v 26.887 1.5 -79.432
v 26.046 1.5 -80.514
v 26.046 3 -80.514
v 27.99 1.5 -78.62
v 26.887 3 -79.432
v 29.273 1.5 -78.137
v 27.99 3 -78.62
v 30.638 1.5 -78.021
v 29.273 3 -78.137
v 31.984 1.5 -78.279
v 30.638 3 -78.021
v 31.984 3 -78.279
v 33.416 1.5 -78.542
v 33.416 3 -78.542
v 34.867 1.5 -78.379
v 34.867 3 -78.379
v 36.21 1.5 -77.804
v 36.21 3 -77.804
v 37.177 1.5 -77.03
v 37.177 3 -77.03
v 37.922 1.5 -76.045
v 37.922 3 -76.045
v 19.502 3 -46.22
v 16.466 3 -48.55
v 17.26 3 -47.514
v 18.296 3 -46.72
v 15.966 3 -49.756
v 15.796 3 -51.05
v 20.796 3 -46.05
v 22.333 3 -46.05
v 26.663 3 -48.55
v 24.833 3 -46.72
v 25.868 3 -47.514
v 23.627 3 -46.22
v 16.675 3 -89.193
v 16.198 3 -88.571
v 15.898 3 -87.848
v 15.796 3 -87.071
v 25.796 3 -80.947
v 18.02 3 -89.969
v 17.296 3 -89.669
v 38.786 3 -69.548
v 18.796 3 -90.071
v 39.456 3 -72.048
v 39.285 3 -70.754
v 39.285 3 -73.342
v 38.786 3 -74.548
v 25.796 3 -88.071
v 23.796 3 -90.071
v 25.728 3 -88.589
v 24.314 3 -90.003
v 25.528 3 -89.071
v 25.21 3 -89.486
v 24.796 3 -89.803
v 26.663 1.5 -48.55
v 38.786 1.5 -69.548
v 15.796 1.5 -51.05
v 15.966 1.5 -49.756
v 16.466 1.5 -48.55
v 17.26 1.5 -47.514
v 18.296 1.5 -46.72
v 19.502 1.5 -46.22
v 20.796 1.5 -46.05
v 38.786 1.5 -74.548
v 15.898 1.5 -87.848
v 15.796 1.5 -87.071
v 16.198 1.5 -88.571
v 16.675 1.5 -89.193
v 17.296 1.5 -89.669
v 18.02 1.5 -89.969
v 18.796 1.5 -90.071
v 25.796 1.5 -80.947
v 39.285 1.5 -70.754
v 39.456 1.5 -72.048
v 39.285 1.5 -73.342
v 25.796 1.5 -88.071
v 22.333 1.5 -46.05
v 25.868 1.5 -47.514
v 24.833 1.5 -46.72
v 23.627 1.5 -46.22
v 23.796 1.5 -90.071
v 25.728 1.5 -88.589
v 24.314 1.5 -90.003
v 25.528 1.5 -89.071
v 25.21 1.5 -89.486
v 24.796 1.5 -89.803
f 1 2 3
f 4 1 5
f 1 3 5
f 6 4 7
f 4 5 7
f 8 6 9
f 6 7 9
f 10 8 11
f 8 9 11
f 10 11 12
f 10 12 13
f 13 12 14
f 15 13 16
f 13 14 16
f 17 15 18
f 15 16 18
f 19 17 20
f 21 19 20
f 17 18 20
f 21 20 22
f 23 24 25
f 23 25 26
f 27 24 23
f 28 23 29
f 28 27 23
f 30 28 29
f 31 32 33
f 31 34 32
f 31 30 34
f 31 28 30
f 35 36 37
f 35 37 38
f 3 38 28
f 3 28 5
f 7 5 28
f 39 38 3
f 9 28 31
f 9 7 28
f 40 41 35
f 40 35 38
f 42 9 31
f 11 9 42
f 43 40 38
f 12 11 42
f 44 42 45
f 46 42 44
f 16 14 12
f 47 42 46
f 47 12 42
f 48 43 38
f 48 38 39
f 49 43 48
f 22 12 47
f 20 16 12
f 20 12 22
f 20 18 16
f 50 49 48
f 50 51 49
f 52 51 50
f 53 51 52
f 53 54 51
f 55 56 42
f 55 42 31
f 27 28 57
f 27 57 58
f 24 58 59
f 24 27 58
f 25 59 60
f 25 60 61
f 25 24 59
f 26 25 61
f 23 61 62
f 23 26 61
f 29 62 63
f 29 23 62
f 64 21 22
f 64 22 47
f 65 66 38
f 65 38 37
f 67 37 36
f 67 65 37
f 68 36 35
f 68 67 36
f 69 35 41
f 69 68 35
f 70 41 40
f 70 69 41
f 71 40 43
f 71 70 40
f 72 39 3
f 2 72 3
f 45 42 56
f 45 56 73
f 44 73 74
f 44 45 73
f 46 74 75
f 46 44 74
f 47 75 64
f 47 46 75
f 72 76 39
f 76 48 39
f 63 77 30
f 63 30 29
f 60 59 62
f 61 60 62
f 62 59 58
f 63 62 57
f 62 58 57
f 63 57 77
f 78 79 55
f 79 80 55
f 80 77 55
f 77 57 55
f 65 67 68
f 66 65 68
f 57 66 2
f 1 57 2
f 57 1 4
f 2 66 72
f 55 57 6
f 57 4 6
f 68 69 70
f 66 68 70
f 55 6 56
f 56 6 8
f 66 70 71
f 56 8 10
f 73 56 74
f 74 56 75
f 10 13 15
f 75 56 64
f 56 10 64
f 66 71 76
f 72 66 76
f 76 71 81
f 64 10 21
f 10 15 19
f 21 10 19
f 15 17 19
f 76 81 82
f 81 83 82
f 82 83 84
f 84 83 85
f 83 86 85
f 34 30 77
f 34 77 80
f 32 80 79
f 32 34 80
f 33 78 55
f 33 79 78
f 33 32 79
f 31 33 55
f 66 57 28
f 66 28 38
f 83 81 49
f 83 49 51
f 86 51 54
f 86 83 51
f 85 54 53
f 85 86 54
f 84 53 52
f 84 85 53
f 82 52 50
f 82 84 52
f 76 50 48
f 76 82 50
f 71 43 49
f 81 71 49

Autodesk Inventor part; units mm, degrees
ref_plane "YZ Plane" through (0, 0, 0) normal (1, 0, 0) x (0, 1, 0)
ref_plane "XZ Plane" through (0, 0, 0) normal (0, 1, 0) x (-1, 0, 0)
ref_plane "XY Plane" through (0, 0, 0) normal (0, 0, 1) x (1, 0, 0)
sketch "スケッチ1" plane through (0, 0, 0) normal (0, 1, 0) x (-1, 0, 0)
  line L0 (75, 0) -> (105, -51.9615)
  line L1 (-75, 0) -> (-105, -51.9615)
  line L2 (0, -218.2384) -> (0, 36.3731)
  line L3 (147, 0) -> (-147, 0)
  line L4 (37.5, -27) -> (-37.5, -27)
  line L5 (105, -51.9615) -> (30, -181.8653)
  line L6 (30, -181.8653) -> (-30, -181.8653)
  line L7 (-30, -181.8653) -> (-105, -51.9615)
  line L8 (75, 0) -> (-75, 0)
  line L9 (-25.3673, -135.8894) -> (-62.8673, -70.9375)
  line L10 (25.3673, -135.8894) -> (62.8673, -70.9375)
  line L11 (-37.5, -27) -> (-27.5, -27)
  line L12 (-27.5, -27) -> (-27.5, -39)
  line L13 (-27.5, -39) -> (-37.5, -39)
  line L14 (-37.5, -39) -> (-37.5, -27)
  line L15 (37.5, -27) -> (27.5, -27)
  line L16 (27.5, -27) -> (27.5, -39)
  line L17 (27.5, -39) -> (37.5, -39)
  line L18 (37.5, -39) -> (37.5, -27)
  line L19 (0, -77.9423) -> (44.1173, -103.4134) construction
  line L20 (0, -77.9423) -> (-44.1173, -103.4134) construction
  line L21 (-44.1173, -103.4134) -> (-67.5, -116.9134) construction
  line L22 (-57.8673, -79.5977) -> (-47.475, -73.5977)
  line L23 (-52.475, -64.9375) -> (-62.8673, -70.9375)
  line L24 (-62.8673, -70.9375) -> (-57.8673, -79.5977)
  line L25 (-47.475, -73.5977) -> (-52.475, -64.9375)
  line L26 (-25.3673, -135.8894) -> (-30.3673, -127.2291)
  line L27 (-19.975, -121.2291) -> (-14.975, -129.8894)
  line L28 (-14.975, -129.8894) -> (-25.3673, -135.8894)
  line L29 (-30.3673, -127.2291) -> (-19.975, -121.2291)
  line L30 (30.3673, -127.2291) -> (19.975, -121.2291)
  line L31 (14.975, -129.8894) -> (25.3673, -135.8894)
  line L32 (25.3673, -135.8894) -> (30.3673, -127.2291)
  line L33 (19.975, -121.2291) -> (14.975, -129.8894)
  line L34 (62.8673, -70.9375) -> (57.8673, -79.5977)
  line L35 (47.475, -73.5977) -> (52.475, -64.9375)
  line L36 (52.475, -64.9375) -> (62.8673, -70.9375)
  line L37 (57.8673, -79.5977) -> (47.475, -73.5977)
  line L38 (62.8673, -70.9375) -> (37.5, -27)
  line L39 (-37.5, -27) -> (-62.8673, -70.9375)
  line L40 (-25.3673, -135.8894) -> (25.3673, -135.8894)
  line L41 (-25.3673, -135.8894) -> (-25.3673, -181.8653)
  line L42 (25.3673, -135.8894) -> (25.3673, -181.8653)
  line L43 (-25.3673, -135.8894) -> (-48.75, -149.3894)
  line L44 (25.3673, -135.8894) -> (48.75, -149.3894)
  point P0 (0, 0)
  point P1 (0, 0)
  point P2 (0, -27)
  dimension "d1" = 150
  dimension "d2" = 60
  dimension "d3" = 60
  dimension "d4" = 27
  dimension "d5" = 75
  dimension "d6" = 60
  dimension "d7" = 27
  dimension "d8" = 10
  dimension "d9" = 12
  dimension "d10" = 10
  dimension "d11" = 12
  dimension "d14" = 360
extrude "プレート1" add sketch "スケッチ1" along normal blind 1.5 contours L5 L6 L42 L44 | L4 L16 L17 L18 L38 L36 L35 L37 L10 L30 L33 L31 L40 L2 | L2 L40 L28 L27 L29 L9 L22 L25 L23 L39 L14 L13 L12 L4 | L31 L33 L30 L10 | L42 L6 L2 L40 | L2 L6 L41 L40 | L4 L18 L17 L16 | L12 L13 L14 L4 | L9 L29 L27 L28 | L41 L6 L7 L43 | L37 L35 L36 L10 | L23 L25 L22 L9
sketch "スケッチ2" plane through (0, 0, 0) normal (0, -1, 0) x (1, 0, 0)
  line L0 (23.3798, -38.55) -> (-23.3798, -38.55) projected
  line L1 (8.2, -46.6) -> (-8.2, -46.6) projected
  arc A0 (-21.1, -27) -> (-23.3798, -38.55) centre (-21.1, -33) ccw projected
  line L2 (-27.5, -27) -> (-27.5, -39) projected
  line L3 (27.5, -39) -> (27.5, -27) projected
  line L4 (-27.5, -39) -> (-27.5, -40.55)
  line L5 (-27.5, -40.55) -> (-10.2, -40.55)
  line L6 (-10.2, -40.55) -> (-10.2, -48.6)
  line L7 (-10.2, -48.6) -> (10.2, -48.6)
  line L8 (10.2, -48.6) -> (10.2, -40.55)
  line L9 (10.2, -40.55) -> (27.5, -40.55)
  line L10 (27.5, -40.55) -> (27.5, -39)
  line L11 (-37.5, -27) -> (-27.5, -27) projected
  line L12 (-37.5, -27) -> (37.5, -27) projected
  line L13 (-20.3112, -101.4469) -> (-30.5112, -83.78)
  line L14 (-27.2827, -105.4719) -> (-20.3112, -101.4469)
  line L15 (-18.6327, -120.4541) -> (-27.2827, -105.4719)
  line L16 (-19.975, -121.2291) -> (-18.6327, -120.4541)
  line L17 (-37.4827, -87.805) -> (-46.1327, -72.8227)
  line L18 (-46.1327, -72.8227) -> (-47.475, -73.5977)
  line L19 (-30.5112, -83.78) -> (-37.4827, -87.805)
  line L20 (30.5112, -83.78) -> (20.3112, -101.4469)
  line L21 (37.4827, -87.805) -> (30.5112, -83.78)
  line L22 (46.1327, -72.8227) -> (37.4827, -87.805)
  line L23 (47.475, -73.5977) -> (46.1327, -72.8227)
  line L24 (27.2827, -105.4719) -> (18.6327, -120.4541)
  line L25 (18.6327, -120.4541) -> (19.975, -121.2291)
  line L26 (20.3112, -101.4469) -> (27.2827, -105.4719)
  line L27 (-47.475, -73.5977) -> (-57.8673, -79.5977)
  line L28 (-57.8673, -79.5977) -> (-30.3673, -127.2291)
  line L29 (-30.3673, -127.2291) -> (-19.975, -121.2291)
  line L30 (19.975, -121.2291) -> (30.3673, -127.2291)
  line L31 (30.3673, -127.2291) -> (57.8673, -79.5977)
  line L32 (57.8673, -79.5977) -> (47.475, -73.5977)
  point P0 (0, 0)
  point P1 (0, -77.9423)
  point P2 (-23.0432, -100.7148)
  point P3 (-33.5673, -121.6866)
  point P4 (-22.4248, -117.8859)
  point P5 (-25.3673, -135.8894)
  point P6 (-28.3712, -118.6866)
  point P7 (-31.2432, -86.512)
  point P8 (-45.8046, -77.3909)
  point P9 (-62.8673, -70.9375)
  point P10 (31.2432, -86.512)
  point P11 (54.6673, -85.1403)
  point P12 (45.8046, -77.3909)
  point P13 (62.8673, -70.9375)
  point P14 (49.4712, -82.1403)
  point P15 (23.0432, -100.7148)
  point P16 (22.4248, -117.8859)
  point P17 (25.3673, -135.8894)
  dimension "d17" = 2
  dimension "d18" = 2
  dimension "d19" = 2
  dimension "d20" = 2
  dimension "d26" = 360
extrude "切り取り1" cut sketch "スケッチ2" against normal blind 1.5
fillet "フィレット1" radius 1.5 18 edges at (-10.2, 0.75, -48.6) (-10.2, 0.75, -40.55) (-27.5, 0.75, -40.55) (10.2, 0.75, -48.6) (10.2, 0.75, -40.55) (27.5, 0.75, -40.55) (-30.5112, 0.75, -83.78) (-46.1327, 0.75, -72.8227) (-20.3112, 0.75, -101.4469) (-27.2827, 0.75, -105.4719) (-37.4827, 0.75, -87.805) (-18.6327, 0.75, -120.4541) (20.3112, 0.75, -101.4469) (27.2827, 0.75, -105.4719) (18.6327, 0.75, -120.4541) (30.5112, 0.75, -83.78) (37.4827, 0.75, -87.805) (46.1327, 0.75, -72.8227)
sketch "スケッチ3" plane through (0, 0, 0) normal (0, -1, 0) x (1, 0, 0)
  circle A0 centre (40.9875, -45.0405) radius 1.6 projected
  circle A1 centre (48.9875, -58.8969) radius 1.6 projected
  circle A2 centre (8, -129.8894) radius 1.6 projected
  circle A3 centre (-8, -129.8894) radius 1.6 projected
  circle A4 centre (-48.9875, -58.8969) radius 1.6 projected
  circle A5 centre (-40.9875, -45.0405) radius 1.6 projected
  point P0 (0, 0)
extrude "切り取り2" cut sketch "スケッチ3" against normal blind 1.5
sketch "スケッチ4" plane through (0, 0, 0) normal (0, -1, 0) x (1, 0, 0)
  circle A0 centre (10, -176.8653) radius 1.35 projected
  circle A1 centre (21.2333, -145.0496) radius 1.6 projected
  circle A2 centre (10, -143.8894) radius 1.6 projected
  line L0 (52.75, -142.4612) -> (30, -181.8653) projected
  line L1 (52.75, -142.4612) -> (33.6974, -131.4612) projected
  line L2 (33.6974, -131.4612) -> (27.1974, -142.7195) projected
  line L3 (27.1974, -142.7195) -> (20.5635, -138.8894) projected
  line L4 (20.5635, -138.8894) -> (5, -138.8894) projected
  line L5 (5, -138.8894) -> (5, -181.8653) projected
  line L6 (30, -181.8653) -> (5, -181.8653) projected
  circle A3 centre (-10, -176.8653) radius 1.35 projected
  circle A4 centre (-21.2333, -145.0496) radius 1.6 projected
  circle A5 centre (-10, -143.8894) radius 1.6 projected
  line L7 (-12.9295, -171.4323) -> (-35.4295, -132.4612) projected
  line L8 (-30.25, -181.4323) -> (-12.9295, -171.4323) projected
  line L9 (-30, -181.8653) -> (-30.25, -181.4323) projected
  line L10 (-30, -181.8653) -> (-5, -181.8653) projected
  line L11 (-5, -181.8653) -> (-5, -138.8894) projected
  line L12 (-5, -138.8894) -> (-20.5635, -138.8894) projected
  line L13 (-20.5635, -138.8894) -> (-27.1974, -142.7195) projected
  line L14 (-33.6974, -131.4612) -> (-27.1974, -142.7195) projected
  line L15 (-35.4295, -132.4612) -> (-33.6974, -131.4612) projected
  point P0 (0, 0)
extrude "切り取り3" cut sketch "スケッチ4" against normal blind 1.5 contours A0 | A1 | A2 | A3 | A4 | A5
sketch "スケッチ5" plane through (0, 1.5, 0) normal (0, 1, 0) x (1, 0, 0)
  line L0 (-19.975, 121.2291) -> (19.975, 121.2291) projected
  line L1 (47.475, 73.5977) -> (27.5, 39) projected
  line L2 (-47.475, 73.5977) -> (-27.5, 39) projected
  point P0 (0, 0)
sketch "スケッチ6" plane through (0, 1.5, 0) normal (0, 1, 0) x (1, 0, 0)
  line L0 (-26.0855, 44.55) -> (-41.9613, 72.0477)
  line L1 (-41.9613, 72.0477) -> (-36.0186, 82.3409)
  line L2 (-36.0186, 82.3409) -> (-29.0471, 78.3159)
  line L3 (-29.0471, 78.3159) -> (-14.8471, 102.911)
  line L4 (-14.8471, 102.911) -> (-21.8186, 106.936)
  line L5 (-21.8186, 106.936) -> (-15.8758, 117.2291)
  line L6 (-15.8758, 117.2291) -> (15.8758, 117.2291)
  line L7 (15.8758, 117.2291) -> (21.8186, 106.936)
  line L8 (21.8186, 106.936) -> (14.8471, 102.911)
  line L9 (14.8471, 102.911) -> (29.0471, 78.3159)
  line L10 (29.0471, 78.3159) -> (36.0186, 82.3409)
  line L11 (36.0186, 82.3409) -> (41.9613, 72.0477)
  line L12 (41.9613, 72.0477) -> (26.0855, 44.55)
  line L13 (26.0855, 44.55) -> (14.2, 44.55)
  line L14 (14.2, 44.55) -> (14.2, 52.6)
  line L15 (14.2, 52.6) -> (-14.2, 52.6)
  line L16 (-14.2, 52.6) -> (-14.2, 44.55)
  line L17 (-14.2, 44.55) -> (-26.0855, 44.55)
  line L18 (-47.475, 73.5977) -> (-27.5, 39) projected
  line L19 (-38.2327, 86.5059) -> (-45.3827, 74.1218) projected
  line L20 (-31.8102, 84.53) -> (-36.1836, 87.055) projected
  line L21 (-21.0612, 100.1479) -> (-29.7612, 85.079) projected
  line L22 (-25.9836, 104.7219) -> (-21.6102, 102.1969) projected
  line L23 (-19.3827, 119.1551) -> (-26.5327, 106.7709) projected
  line L24 (-19.975, 121.2291) -> (19.975, 121.2291) projected
  line L25 (47.475, 73.5977) -> (27.5, 39) projected
  line L26 (26.5327, 106.7709) -> (19.3827, 119.1551) projected
  line L27 (21.6102, 102.1969) -> (25.9836, 104.7219) projected
  line L28 (29.7612, 85.079) -> (21.0612, 100.1479) projected
  line L29 (36.1836, 87.055) -> (31.8102, 84.53) projected
  line L30 (45.3827, 74.1218) -> (38.2327, 86.5059) projected
  line L31 (11.7, 40.55) -> (26, 40.55) projected
  line L32 (10.2, 47.1) -> (10.2, 42.05) projected
  line L33 (-8.7, 48.6) -> (8.7, 48.6) projected
  line L34 (-10.2, 42.05) -> (-10.2, 47.1) projected
  line L35 (-26, 40.55) -> (-11.7, 40.55) projected
  line L36 (0, 48.6) -> (0, 121.2291)
  line L37 (-25.4112, 92.6134) -> (-31.0836, 95.8884) construction
  point P0 (0, 0)
  dimension "d32" = 4
  dimension "d33" = 4
  dimension "d34" = 4
  dimension "d35" = 4
  dimension "d36" = 4
  dimension "d37" = 4
  dimension "d38" = 4
  dimension "d39" = 4
  dimension "d40" = 4
extrude "切り取り4" cut sketch "スケッチ6" against normal blind 1.5
fillet "フィレット2" radius 5 9 edges at (-14.2, 0.75, -44.55) (-26.0855, 0.75, -44.55) (-41.9613, 0.75, -72.0477) (-36.0186, 0.75, -82.3409) (-21.8186, 0.75, -106.936) (-15.8758, 0.75, -117.2291) (-14.2, 0.75, -52.6) (-29.0471, 0.75, -78.3159) (-14.8471, 0.75, -102.911)
mirror "ミラー1" about plane through (0, 0, 0) normal (1, 0, 0) of "フィレット2"
sketch "スケッチ7" plane through (0, 1.5, 0) normal (0, 1, 0) x (1, 0, 0)
  arc A0 (18.2848, 105.0066) -> (17.2511, 98.7471) centre (21.5812, 101.2471) ccw projected
  line L0 (17.2511, 98.7471) -> (26.643, 82.4797) projected
  arc A1 (26.643, 82.4797) -> (32.5808, 80.2452) centre (30.9732, 84.9797) ccw projected
  arc A2 (38.5186, 78.0107) -> (32.5808, 80.2452) centre (34.1884, 75.5107) ccw projected
  line L1 (38.5186, 78.0107) -> (40.5179, 74.5477) projected
  arc A3 (40.5179, 69.5477) -> (40.5179, 74.5477) centre (36.1878, 72.0477) ccw projected
  line L2 (40.5179, 69.5477) -> (27.5289, 47.05) projected
  arc A4 (23.1987, 44.55) -> (27.5289, 47.05) centre (23.1987, 49.55) ccw projected
  line L3 (23.1987, 44.55) -> (19.2, 44.55) projected
  arc A5 (14.296, 48.575) -> (19.2, 44.55) centre (19.2, 49.55) ccw projected
  arc A6 (14.296, 48.575) -> (9.392, 52.6) centre (9.392, 47.6) ccw projected
  line L4 (9.392, 52.6) -> (-9.392, 52.6) projected
  arc A7 (-9.392, 52.6) -> (-14.296, 48.575) centre (-9.392, 47.6) ccw projected
  arc A8 (-19.2, 44.55) -> (-14.296, 48.575) centre (-19.2, 49.55) ccw projected
  line L5 (-19.2, 44.55) -> (-23.1987, 44.55) projected
  arc A9 (-27.5289, 47.05) -> (-23.1987, 44.55) centre (-23.1987, 49.55) ccw projected
  line L6 (-27.5289, 47.05) -> (-40.5179, 69.5477) projected
  arc A10 (-40.5179, 74.5477) -> (-40.5179, 69.5477) centre (-36.1878, 72.0477) ccw projected
  line L7 (-40.5179, 74.5477) -> (-38.5186, 78.0107) projected
  arc A11 (-32.5808, 80.2452) -> (-38.5186, 78.0107) centre (-34.1884, 75.5107) ccw projected
  arc A12 (-32.5808, 80.2452) -> (-26.643, 82.4797) centre (-30.9732, 84.9797) ccw projected
  line L8 (-26.643, 82.4797) -> (-17.2511, 98.7471) projected
  arc A13 (-17.2511, 98.7471) -> (-18.2848, 105.0066) centre (-21.5812, 101.2471) ccw projected
  arc A14 (-19.3186, 111.2661) -> (-18.2848, 105.0066) centre (-14.9884, 108.7661) ccw projected
  line L9 (-19.3186, 111.2661) -> (-17.3192, 114.7291) projected
  arc A15 (-12.9891, 117.2291) -> (-17.3192, 114.7291) centre (-12.9891, 112.2291) ccw projected
  line L10 (-12.9891, 117.2291) -> (12.9891, 117.2291) projected
  arc A16 (17.3192, 114.7291) -> (12.9891, 117.2291) centre (12.9891, 112.2291) ccw projected
  line L11 (17.3192, 114.7291) -> (19.3186, 111.2661) projected
  arc A17 (18.2848, 105.0066) -> (19.3186, 111.2661) centre (14.9884, 108.7661) ccw projected
  circle A18 centre (21.2333, 145.0496) radius 1.6 projected
  circle A19 centre (-10, 143.8894) radius 1.6 projected
  circle A20 centre (-10, 176.8653) radius 1.35 projected
  circle A21 centre (-21.2333, 145.0496) radius 1.6 projected
  circle A22 centre (10, 176.8653) radius 1.35 projected
  circle A23 centre (10, 143.8894) radius 1.6 projected
  circle A24 centre (-48.9875, 58.8969) radius 1.6 projected
  circle A25 centre (8, 129.8894) radius 1.6 projected
  circle A26 centre (40.9875, 45.0405) radius 1.6 projected
  circle A27 centre (48.9875, 58.8969) radius 1.6 projected
  circle A28 centre (-8, 129.8894) radius 1.6 projected
  circle A29 centre (-40.9875, 45.0405) radius 1.6 projected
  arc A30 (38.2327, 86.5059) -> (36.1836, 87.055) centre (36.9336, 85.7559) ccw projected
  line L12 (36.1836, 87.055) -> (31.8102, 84.53) projected
  arc A31 (29.7612, 85.079) -> (31.8102, 84.53) centre (31.0602, 85.829) ccw projected
  line L13 (29.7612, 85.079) -> (21.0612, 100.1479) projected
  arc A32 (21.6102, 102.1969) -> (21.0612, 100.1479) centre (22.3602, 100.8979) ccw projected
  line L14 (21.6102, 102.1969) -> (25.9836, 104.7219) projected
  arc A33 (25.9836, 104.7219) -> (26.5327, 106.7709) centre (25.2336, 106.0209) ccw projected
  line L15 (26.5327, 106.7709) -> (19.3827, 119.1551) projected
  arc A34 (19.9317, 121.2041) -> (19.3827, 119.1551) centre (20.6817, 119.9051) ccw projected
  line L16 (19.9317, 121.2041) -> (30.3673, 127.2291) projected
  line L17 (25.3673, 135.8894) -> (30.3673, 127.2291) projected
  line L18 (48.75, 149.3894) -> (25.3673, 135.8894) projected
  line L19 (30, 181.8653) -> (48.75, 149.3894) projected
  line L20 (-30, 181.8653) -> (30, 181.8653) projected
  line L21 (-48.75, 149.3894) -> (-30, 181.8653) projected
  line L22 (-25.3673, 135.8894) -> (-48.75, 149.3894) projected
  line L23 (-30.3673, 127.2291) -> (-25.3673, 135.8894) projected
  line L24 (-30.3673, 127.2291) -> (-19.9317, 121.2041) projected
  arc A35 (-19.3827, 119.1551) -> (-19.9317, 121.2041) centre (-20.6817, 119.9051) ccw projected
  line L25 (-19.3827, 119.1551) -> (-26.5327, 106.7709) projected
  arc A36 (-26.5327, 106.7709) -> (-25.9836, 104.7219) centre (-25.2336, 106.0209) ccw projected
  line L26 (-25.9836, 104.7219) -> (-21.6102, 102.1969) projected
  arc A37 (-21.0612, 100.1479) -> (-21.6102, 102.1969) centre (-22.3602, 100.8979) ccw projected
  line L27 (-21.0612, 100.1479) -> (-29.7612, 85.079) projected
  arc A38 (-31.8102, 84.53) -> (-29.7612, 85.079) centre (-31.0602, 85.829) ccw projected
  line L28 (-31.8102, 84.53) -> (-36.1836, 87.055) projected
  arc A39 (-36.1836, 87.055) -> (-38.2327, 86.5059) centre (-36.9336, 85.7559) ccw projected
  line L29 (-38.2327, 86.5059) -> (-45.3827, 74.1218) projected
  arc A40 (-47.4317, 73.5727) -> (-45.3827, 74.1218) centre (-46.6817, 74.8718) ccw projected
  line L30 (-47.4317, 73.5727) -> (-57.8673, 79.5977) projected
  line L31 (-62.8673, 70.9375) -> (-57.8673, 79.5977) projected
  line L32 (-37.5, 27) -> (-62.8673, 70.9375) projected
  line L33 (-27.5, 27) -> (-37.5, 27) projected
  line L34 (-27.5, 27) -> (-27.5, 39.05) projected
  arc A41 (-26, 40.55) -> (-27.5, 39.05) centre (-26, 39.05) ccw projected
  line L35 (-26, 40.55) -> (-11.7, 40.55) projected
  arc A42 (-11.7, 40.55) -> (-10.2, 42.05) centre (-11.7, 42.05) ccw projected
  line L36 (-10.2, 42.05) -> (-10.2, 47.1) projected
  arc A43 (-8.7, 48.6) -> (-10.2, 47.1) centre (-8.7, 47.1) ccw projected
  line L37 (-8.7, 48.6) -> (8.7, 48.6) projected
  arc A44 (10.2, 47.1) -> (8.7, 48.6) centre (8.7, 47.1) ccw projected
  line L38 (10.2, 47.1) -> (10.2, 42.05) projected
  arc A45 (10.2, 42.05) -> (11.7, 40.55) centre (11.7, 42.05) ccw projected
  line L39 (11.7, 40.55) -> (26, 40.55) projected
  arc A46 (27.5, 39.05) -> (26, 40.55) centre (26, 39.05) ccw projected
  line L40 (27.5, 39.05) -> (27.5, 27) projected
  line L41 (37.5, 27) -> (27.5, 27) projected
  line L42 (62.8673, 70.9375) -> (37.5, 27) projected
  line L43 (57.8673, 79.5977) -> (62.8673, 70.9375) projected
  line L44 (57.8673, 79.5977) -> (47.4317, 73.5727) projected
  arc A47 (45.3827, 74.1218) -> (47.4317, 73.5727) centre (46.6817, 74.8718) ccw projected
  line L45 (45.3827, 74.1218) -> (38.2327, 86.5059) projected
  line L46 (25.2195, 46.05) -> (15.796, 46.05)
  line L47 (15.796, 46.05) -> (15.796, 54.1)
  line L48 (15.796, 54.1) -> (-15.796, 54.1)
  line L49 (-15.796, 54.1) -> (-15.796, 46.05)
  line L50 (-15.796, 46.05) -> (-25.2195, 46.05)
  line L51 (-25.2195, 46.05) -> (-40.2293, 72.0477)
  line L52 (-40.2293, 72.0477) -> (-35.5175, 80.2087)
  line L53 (-35.5175, 80.2087) -> (-28.546, 76.1837)
  line L54 (-28.546, 76.1837) -> (-12.75, 103.5432)
  line L55 (-12.75, 103.5432) -> (-19.7215, 107.5682)
  line L56 (-19.7215, 107.5682) -> (-15.0098, 115.7291)
  line L57 (-15.0098, 115.7291) -> (15.0098, 115.7291)
  line L58 (15.0098, 115.7291) -> (19.7215, 107.5682)
  line L59 (19.7215, 107.5682) -> (12.75, 103.5432)
  line L60 (12.75, 103.5432) -> (28.546, 76.1837)
  line L61 (28.546, 76.1837) -> (35.5175, 80.2087)
  line L62 (35.5175, 80.2087) -> (40.2293, 72.0477)
  line L63 (40.2293, 72.0477) -> (25.2195, 46.05)
  line L64 (0, 54.1) -> (0, 115.7291) construction
  line L65 (0, 218.2384) -> (0, -36.3731) construction
  line L66 (40.5179, 69.5477) -> (27.5289, 47.05) projected
  line L67 (20.648, 89.8634) -> (0, 77.9423) construction
  line L68 (0, 54.1) -> (0, 77.9423) construction
  line L69 (17.3192, 114.7291) -> (19.3186, 111.2661) projected
  point P0 (0, 0)
  dimension "d44" = 1.5
  dimension "d45" = 1.5
  dimension "d46" = 1.5
  dimension "d47" = 1.5
  dimension "d48" = 1.5
  dimension "d49" = 1.5
  dimension "d50" = 1.5
  dimension "d51" = 1.5
extrude "押し出し1" cut sketch "スケッチ7" against normal through all contours A0 L0 A1 A2 L1 A3 L2 A4 L3 A5 A6 L4 A7 A8 L5 A9 L6 A10 L7 A11 A12 L8 A13 A14 L9 A15 L10 A16 L11 A17 | L45 A47 L44 L43 L42 L41 L40 A46 L39 A45 L38 A44 L37 A43 L36 A42 L35 A41 L34 L33 L32 L31 L30 A40 L29 A39 L28 A38 L27 A37 L26 A36 L25 A35 L24 L23 L22 L21 L20 L19 L18 L17 L16 A34 L15 A33 L14 A32 L13 A31 L12 A30 | L46 L47 L48 L49 L50 L51 L52 L53 L54 L55 L56 L57 L58 L59 L60 L61 L62 L63
extrude "押し出し2" add sketch "スケッチ7" along normal blind 1.5 contours L46 L47 L48 L49 L50 L51 L52 L53 L54 L55 L56 L57 L58 L59 L60 L61 L62 L63
sketch "スケッチ8" plane through (0, 3, 0) normal (0, 1, 0) x (1, 0, 0)
  line L0 (15, 59.1) -> (-15, 59.1)
  line L1 (-15, 59.1) -> (-15, 124.1)
  line L2 (-15, 124.1) -> (15, 124.1)
  line L3 (15, 124.1) -> (15, 59.1)
  line L4 (-15.796, 54.1) -> (15.796, 54.1) projected
  line L5 (15.0098, 115.7291) -> (-15.0098, 115.7291) projected
  line L6 (15, 59.1) -> (15, 54.1)
  line L7 (-15.796, 46.05) -> (-15.796, 54.1) projected
  line L8 (-25.2195, 46.05) -> (-15.796, 46.05) projected
  line L9 (-40.2293, 72.0477) -> (-25.2195, 46.05) projected
  line L10 (-35.5175, 80.2087) -> (-40.2293, 72.0477) projected
  line L11 (-28.546, 76.1837) -> (-35.5175, 80.2087) projected
  line L12 (-12.75, 103.5432) -> (-28.546, 76.1837) projected
  line L13 (-19.7215, 107.5682) -> (-12.75, 103.5432) projected
  line L14 (-15.0098, 115.7291) -> (-19.7215, 107.5682) projected
  line L15 (15.796, 54.1) -> (15.796, 114.3674)
  line L16 (19.7215, 107.5682) -> (15.0098, 115.7291) projected
  line L17 (12.75, 103.5432) -> (19.7215, 107.5682) projected
  point P0 (0, 0)
  point P1 (0, 59.1)
  point P2 (0, 54.1)
  point P3 (-15, 115.7291)
  point P4 (15, 115.7291)
  point P5 (-15, 104.8422)
  point P6 (-15, 99.6461)
  point P7 (15.796, 105.3017)
  dimension "d56" = 65
  dimension "d57" = 30
  dimension "d58" = 5
extrude "押し出し3" cut sketch "スケッチ8" against normal through all
fillet "フィレット4" radius 5 5 edges at (28.546, 2.25, -76.1837) (35.5175, 2.25, -80.2087) (40.2293, 2.25, -72.0477) (25.2195, 2.25, -46.05) (15.796, 2.25, -46.05)
fillet "フィレット5" radius 3 1 edges at (15.796, 2.25, -98.2674)
sketch "スケッチ9" plane through (0, 1.5, 0) normal (0, -1, 0) x (1, 0, 0)
  line L0 (11.5, -82.5) -> (11.5, -82.525) projected
  line L1 (11.5, -82.5) -> (14.13, -82.5) projected
  arc A0 (14.13, -82.5) -> (14.18, -82.45) centre (14.13, -82.45) ccw projected
  line L2 (14.18, -82.95) -> (14.18, -82.45) projected
  arc A1 (14.18, -82.95) -> (14.13, -82.9) centre (14.13, -82.95) ccw projected
  line L3 (11.5, -82.9) -> (14.13, -82.9) projected
  line L4 (11.5, -82.875) -> (11.5, -82.9) projected
  line L5 (11.11, -82.875) -> (11.5, -82.875) projected
  arc A2 (11.0667, -82.85) -> (11.11, -82.875) centre (11.11, -82.825) ccw projected
  arc A3 (11.0667, -82.85) -> (11.0234, -82.825) centre (11.0234, -82.875) ccw projected
  line L6 (10.96, -82.825) -> (11.0234, -82.825) projected
  line L7 (10.96, -82.575) -> (10.96, -82.825) projected
  line L8 (11.0234, -82.575) -> (10.96, -82.575) projected
  arc A4 (11.0234, -82.575) -> (11.0667, -82.55) centre (11.0234, -82.525) ccw projected
  arc A5 (11.11, -82.525) -> (11.0667, -82.55) centre (11.11, -82.575) ccw projected
  line L9 (11.5, -82.525) -> (11.11, -82.525) projected
  line L10 (13.14, -82.875) -> (13.14, -82.525) projected
  line L11 (13.14, -82.875) -> (13.2786, -82.875) projected
  line L12 (13.2786, -82.875) -> (13.2786, -82.525) projected
  line L13 (13.2786, -82.525) -> (13.14, -82.525) projected
  arc A6 (15.796, -87.0713) -> (21.3941, -88.5713) centre (18.796, -87.0713) ccw projected
  point P0 (0, 0)
  point P1 (14.18, -82.7)
  dimension "d64" = 4.3713
sketch "スケッチ10" plane through (0, 3, 0) normal (0, 1, 0) x (1, 0, 0)
  arc A0 (21.3941, 88.5713) -> (15.796, 87.0713) centre (18.796, 87.0713) ccw projected
  line L0 (18.796, 90.0713) -> (25.796, 90.0713)
  line L1 (25.796, 90.0713) -> (25.796, 80.9469)
  line L2 (26.046, 80.5138) -> (21.3941, 88.5713) projected
  line L3 (15.796, 87.0713) -> (15.796, 51.05) projected
  point P0 (0, 0)
  dimension "d65" = 10
extrude "押し出し4" add sketch "スケッチ10" against normal up to surface (1.5 mm away)
fillet "フィレット6" radius 2 1 edges at (25.796, 2.25, -90.0713)
equation "\"d3\" = d2"
equation "\"d7\" = d4"
equation "\"d19\" = d18"
equation "\"d21\" = Thickness"
equation "\"d28\" = Thickness"
equation "\"d30\" = Thickness"
equation "\"d33\" = d32"
equation "\"d34\" = d32"
equation "\"d35\" = d32"
equation "\"d36\" = d32"
equation "\"d37\" = d32"
equation "\"d38\" = d32"
equation "\"d39\" = d32"
equation "\"d40\" = d32"
equation "\"d41\" = Thickness"
equation "\"d45\" = d44"
equation "\"d46\" = d44"
equation "\"d47\" = d44"
equation "\"d48\" = d44"
equation "\"d49\" = d44"
equation "\"d50\" = d44"
equation "\"d51\" = d44"
equation "\"d16\" = Thickness"
equation "\"BendRadius\" = Thickness"
equation "\"BendReliefWidth\" = Thickness"
equation "\"BendReliefDepth\" = 0.5 * Thickness"
equation "\"CornerReliefSize\" = 4 * Thickness"
equation "\"MinimumRemnant\" = 2 * Thickness"
equation "\"TransitionRadius\" = BendRadius"
equation "\"JacobiRadiusSize\" = BendRadius"
equation "\"GapSize\" = Thickness"
equation "\"Thickness\" = 1.5"
properties part number "CORE_hat_outline"
